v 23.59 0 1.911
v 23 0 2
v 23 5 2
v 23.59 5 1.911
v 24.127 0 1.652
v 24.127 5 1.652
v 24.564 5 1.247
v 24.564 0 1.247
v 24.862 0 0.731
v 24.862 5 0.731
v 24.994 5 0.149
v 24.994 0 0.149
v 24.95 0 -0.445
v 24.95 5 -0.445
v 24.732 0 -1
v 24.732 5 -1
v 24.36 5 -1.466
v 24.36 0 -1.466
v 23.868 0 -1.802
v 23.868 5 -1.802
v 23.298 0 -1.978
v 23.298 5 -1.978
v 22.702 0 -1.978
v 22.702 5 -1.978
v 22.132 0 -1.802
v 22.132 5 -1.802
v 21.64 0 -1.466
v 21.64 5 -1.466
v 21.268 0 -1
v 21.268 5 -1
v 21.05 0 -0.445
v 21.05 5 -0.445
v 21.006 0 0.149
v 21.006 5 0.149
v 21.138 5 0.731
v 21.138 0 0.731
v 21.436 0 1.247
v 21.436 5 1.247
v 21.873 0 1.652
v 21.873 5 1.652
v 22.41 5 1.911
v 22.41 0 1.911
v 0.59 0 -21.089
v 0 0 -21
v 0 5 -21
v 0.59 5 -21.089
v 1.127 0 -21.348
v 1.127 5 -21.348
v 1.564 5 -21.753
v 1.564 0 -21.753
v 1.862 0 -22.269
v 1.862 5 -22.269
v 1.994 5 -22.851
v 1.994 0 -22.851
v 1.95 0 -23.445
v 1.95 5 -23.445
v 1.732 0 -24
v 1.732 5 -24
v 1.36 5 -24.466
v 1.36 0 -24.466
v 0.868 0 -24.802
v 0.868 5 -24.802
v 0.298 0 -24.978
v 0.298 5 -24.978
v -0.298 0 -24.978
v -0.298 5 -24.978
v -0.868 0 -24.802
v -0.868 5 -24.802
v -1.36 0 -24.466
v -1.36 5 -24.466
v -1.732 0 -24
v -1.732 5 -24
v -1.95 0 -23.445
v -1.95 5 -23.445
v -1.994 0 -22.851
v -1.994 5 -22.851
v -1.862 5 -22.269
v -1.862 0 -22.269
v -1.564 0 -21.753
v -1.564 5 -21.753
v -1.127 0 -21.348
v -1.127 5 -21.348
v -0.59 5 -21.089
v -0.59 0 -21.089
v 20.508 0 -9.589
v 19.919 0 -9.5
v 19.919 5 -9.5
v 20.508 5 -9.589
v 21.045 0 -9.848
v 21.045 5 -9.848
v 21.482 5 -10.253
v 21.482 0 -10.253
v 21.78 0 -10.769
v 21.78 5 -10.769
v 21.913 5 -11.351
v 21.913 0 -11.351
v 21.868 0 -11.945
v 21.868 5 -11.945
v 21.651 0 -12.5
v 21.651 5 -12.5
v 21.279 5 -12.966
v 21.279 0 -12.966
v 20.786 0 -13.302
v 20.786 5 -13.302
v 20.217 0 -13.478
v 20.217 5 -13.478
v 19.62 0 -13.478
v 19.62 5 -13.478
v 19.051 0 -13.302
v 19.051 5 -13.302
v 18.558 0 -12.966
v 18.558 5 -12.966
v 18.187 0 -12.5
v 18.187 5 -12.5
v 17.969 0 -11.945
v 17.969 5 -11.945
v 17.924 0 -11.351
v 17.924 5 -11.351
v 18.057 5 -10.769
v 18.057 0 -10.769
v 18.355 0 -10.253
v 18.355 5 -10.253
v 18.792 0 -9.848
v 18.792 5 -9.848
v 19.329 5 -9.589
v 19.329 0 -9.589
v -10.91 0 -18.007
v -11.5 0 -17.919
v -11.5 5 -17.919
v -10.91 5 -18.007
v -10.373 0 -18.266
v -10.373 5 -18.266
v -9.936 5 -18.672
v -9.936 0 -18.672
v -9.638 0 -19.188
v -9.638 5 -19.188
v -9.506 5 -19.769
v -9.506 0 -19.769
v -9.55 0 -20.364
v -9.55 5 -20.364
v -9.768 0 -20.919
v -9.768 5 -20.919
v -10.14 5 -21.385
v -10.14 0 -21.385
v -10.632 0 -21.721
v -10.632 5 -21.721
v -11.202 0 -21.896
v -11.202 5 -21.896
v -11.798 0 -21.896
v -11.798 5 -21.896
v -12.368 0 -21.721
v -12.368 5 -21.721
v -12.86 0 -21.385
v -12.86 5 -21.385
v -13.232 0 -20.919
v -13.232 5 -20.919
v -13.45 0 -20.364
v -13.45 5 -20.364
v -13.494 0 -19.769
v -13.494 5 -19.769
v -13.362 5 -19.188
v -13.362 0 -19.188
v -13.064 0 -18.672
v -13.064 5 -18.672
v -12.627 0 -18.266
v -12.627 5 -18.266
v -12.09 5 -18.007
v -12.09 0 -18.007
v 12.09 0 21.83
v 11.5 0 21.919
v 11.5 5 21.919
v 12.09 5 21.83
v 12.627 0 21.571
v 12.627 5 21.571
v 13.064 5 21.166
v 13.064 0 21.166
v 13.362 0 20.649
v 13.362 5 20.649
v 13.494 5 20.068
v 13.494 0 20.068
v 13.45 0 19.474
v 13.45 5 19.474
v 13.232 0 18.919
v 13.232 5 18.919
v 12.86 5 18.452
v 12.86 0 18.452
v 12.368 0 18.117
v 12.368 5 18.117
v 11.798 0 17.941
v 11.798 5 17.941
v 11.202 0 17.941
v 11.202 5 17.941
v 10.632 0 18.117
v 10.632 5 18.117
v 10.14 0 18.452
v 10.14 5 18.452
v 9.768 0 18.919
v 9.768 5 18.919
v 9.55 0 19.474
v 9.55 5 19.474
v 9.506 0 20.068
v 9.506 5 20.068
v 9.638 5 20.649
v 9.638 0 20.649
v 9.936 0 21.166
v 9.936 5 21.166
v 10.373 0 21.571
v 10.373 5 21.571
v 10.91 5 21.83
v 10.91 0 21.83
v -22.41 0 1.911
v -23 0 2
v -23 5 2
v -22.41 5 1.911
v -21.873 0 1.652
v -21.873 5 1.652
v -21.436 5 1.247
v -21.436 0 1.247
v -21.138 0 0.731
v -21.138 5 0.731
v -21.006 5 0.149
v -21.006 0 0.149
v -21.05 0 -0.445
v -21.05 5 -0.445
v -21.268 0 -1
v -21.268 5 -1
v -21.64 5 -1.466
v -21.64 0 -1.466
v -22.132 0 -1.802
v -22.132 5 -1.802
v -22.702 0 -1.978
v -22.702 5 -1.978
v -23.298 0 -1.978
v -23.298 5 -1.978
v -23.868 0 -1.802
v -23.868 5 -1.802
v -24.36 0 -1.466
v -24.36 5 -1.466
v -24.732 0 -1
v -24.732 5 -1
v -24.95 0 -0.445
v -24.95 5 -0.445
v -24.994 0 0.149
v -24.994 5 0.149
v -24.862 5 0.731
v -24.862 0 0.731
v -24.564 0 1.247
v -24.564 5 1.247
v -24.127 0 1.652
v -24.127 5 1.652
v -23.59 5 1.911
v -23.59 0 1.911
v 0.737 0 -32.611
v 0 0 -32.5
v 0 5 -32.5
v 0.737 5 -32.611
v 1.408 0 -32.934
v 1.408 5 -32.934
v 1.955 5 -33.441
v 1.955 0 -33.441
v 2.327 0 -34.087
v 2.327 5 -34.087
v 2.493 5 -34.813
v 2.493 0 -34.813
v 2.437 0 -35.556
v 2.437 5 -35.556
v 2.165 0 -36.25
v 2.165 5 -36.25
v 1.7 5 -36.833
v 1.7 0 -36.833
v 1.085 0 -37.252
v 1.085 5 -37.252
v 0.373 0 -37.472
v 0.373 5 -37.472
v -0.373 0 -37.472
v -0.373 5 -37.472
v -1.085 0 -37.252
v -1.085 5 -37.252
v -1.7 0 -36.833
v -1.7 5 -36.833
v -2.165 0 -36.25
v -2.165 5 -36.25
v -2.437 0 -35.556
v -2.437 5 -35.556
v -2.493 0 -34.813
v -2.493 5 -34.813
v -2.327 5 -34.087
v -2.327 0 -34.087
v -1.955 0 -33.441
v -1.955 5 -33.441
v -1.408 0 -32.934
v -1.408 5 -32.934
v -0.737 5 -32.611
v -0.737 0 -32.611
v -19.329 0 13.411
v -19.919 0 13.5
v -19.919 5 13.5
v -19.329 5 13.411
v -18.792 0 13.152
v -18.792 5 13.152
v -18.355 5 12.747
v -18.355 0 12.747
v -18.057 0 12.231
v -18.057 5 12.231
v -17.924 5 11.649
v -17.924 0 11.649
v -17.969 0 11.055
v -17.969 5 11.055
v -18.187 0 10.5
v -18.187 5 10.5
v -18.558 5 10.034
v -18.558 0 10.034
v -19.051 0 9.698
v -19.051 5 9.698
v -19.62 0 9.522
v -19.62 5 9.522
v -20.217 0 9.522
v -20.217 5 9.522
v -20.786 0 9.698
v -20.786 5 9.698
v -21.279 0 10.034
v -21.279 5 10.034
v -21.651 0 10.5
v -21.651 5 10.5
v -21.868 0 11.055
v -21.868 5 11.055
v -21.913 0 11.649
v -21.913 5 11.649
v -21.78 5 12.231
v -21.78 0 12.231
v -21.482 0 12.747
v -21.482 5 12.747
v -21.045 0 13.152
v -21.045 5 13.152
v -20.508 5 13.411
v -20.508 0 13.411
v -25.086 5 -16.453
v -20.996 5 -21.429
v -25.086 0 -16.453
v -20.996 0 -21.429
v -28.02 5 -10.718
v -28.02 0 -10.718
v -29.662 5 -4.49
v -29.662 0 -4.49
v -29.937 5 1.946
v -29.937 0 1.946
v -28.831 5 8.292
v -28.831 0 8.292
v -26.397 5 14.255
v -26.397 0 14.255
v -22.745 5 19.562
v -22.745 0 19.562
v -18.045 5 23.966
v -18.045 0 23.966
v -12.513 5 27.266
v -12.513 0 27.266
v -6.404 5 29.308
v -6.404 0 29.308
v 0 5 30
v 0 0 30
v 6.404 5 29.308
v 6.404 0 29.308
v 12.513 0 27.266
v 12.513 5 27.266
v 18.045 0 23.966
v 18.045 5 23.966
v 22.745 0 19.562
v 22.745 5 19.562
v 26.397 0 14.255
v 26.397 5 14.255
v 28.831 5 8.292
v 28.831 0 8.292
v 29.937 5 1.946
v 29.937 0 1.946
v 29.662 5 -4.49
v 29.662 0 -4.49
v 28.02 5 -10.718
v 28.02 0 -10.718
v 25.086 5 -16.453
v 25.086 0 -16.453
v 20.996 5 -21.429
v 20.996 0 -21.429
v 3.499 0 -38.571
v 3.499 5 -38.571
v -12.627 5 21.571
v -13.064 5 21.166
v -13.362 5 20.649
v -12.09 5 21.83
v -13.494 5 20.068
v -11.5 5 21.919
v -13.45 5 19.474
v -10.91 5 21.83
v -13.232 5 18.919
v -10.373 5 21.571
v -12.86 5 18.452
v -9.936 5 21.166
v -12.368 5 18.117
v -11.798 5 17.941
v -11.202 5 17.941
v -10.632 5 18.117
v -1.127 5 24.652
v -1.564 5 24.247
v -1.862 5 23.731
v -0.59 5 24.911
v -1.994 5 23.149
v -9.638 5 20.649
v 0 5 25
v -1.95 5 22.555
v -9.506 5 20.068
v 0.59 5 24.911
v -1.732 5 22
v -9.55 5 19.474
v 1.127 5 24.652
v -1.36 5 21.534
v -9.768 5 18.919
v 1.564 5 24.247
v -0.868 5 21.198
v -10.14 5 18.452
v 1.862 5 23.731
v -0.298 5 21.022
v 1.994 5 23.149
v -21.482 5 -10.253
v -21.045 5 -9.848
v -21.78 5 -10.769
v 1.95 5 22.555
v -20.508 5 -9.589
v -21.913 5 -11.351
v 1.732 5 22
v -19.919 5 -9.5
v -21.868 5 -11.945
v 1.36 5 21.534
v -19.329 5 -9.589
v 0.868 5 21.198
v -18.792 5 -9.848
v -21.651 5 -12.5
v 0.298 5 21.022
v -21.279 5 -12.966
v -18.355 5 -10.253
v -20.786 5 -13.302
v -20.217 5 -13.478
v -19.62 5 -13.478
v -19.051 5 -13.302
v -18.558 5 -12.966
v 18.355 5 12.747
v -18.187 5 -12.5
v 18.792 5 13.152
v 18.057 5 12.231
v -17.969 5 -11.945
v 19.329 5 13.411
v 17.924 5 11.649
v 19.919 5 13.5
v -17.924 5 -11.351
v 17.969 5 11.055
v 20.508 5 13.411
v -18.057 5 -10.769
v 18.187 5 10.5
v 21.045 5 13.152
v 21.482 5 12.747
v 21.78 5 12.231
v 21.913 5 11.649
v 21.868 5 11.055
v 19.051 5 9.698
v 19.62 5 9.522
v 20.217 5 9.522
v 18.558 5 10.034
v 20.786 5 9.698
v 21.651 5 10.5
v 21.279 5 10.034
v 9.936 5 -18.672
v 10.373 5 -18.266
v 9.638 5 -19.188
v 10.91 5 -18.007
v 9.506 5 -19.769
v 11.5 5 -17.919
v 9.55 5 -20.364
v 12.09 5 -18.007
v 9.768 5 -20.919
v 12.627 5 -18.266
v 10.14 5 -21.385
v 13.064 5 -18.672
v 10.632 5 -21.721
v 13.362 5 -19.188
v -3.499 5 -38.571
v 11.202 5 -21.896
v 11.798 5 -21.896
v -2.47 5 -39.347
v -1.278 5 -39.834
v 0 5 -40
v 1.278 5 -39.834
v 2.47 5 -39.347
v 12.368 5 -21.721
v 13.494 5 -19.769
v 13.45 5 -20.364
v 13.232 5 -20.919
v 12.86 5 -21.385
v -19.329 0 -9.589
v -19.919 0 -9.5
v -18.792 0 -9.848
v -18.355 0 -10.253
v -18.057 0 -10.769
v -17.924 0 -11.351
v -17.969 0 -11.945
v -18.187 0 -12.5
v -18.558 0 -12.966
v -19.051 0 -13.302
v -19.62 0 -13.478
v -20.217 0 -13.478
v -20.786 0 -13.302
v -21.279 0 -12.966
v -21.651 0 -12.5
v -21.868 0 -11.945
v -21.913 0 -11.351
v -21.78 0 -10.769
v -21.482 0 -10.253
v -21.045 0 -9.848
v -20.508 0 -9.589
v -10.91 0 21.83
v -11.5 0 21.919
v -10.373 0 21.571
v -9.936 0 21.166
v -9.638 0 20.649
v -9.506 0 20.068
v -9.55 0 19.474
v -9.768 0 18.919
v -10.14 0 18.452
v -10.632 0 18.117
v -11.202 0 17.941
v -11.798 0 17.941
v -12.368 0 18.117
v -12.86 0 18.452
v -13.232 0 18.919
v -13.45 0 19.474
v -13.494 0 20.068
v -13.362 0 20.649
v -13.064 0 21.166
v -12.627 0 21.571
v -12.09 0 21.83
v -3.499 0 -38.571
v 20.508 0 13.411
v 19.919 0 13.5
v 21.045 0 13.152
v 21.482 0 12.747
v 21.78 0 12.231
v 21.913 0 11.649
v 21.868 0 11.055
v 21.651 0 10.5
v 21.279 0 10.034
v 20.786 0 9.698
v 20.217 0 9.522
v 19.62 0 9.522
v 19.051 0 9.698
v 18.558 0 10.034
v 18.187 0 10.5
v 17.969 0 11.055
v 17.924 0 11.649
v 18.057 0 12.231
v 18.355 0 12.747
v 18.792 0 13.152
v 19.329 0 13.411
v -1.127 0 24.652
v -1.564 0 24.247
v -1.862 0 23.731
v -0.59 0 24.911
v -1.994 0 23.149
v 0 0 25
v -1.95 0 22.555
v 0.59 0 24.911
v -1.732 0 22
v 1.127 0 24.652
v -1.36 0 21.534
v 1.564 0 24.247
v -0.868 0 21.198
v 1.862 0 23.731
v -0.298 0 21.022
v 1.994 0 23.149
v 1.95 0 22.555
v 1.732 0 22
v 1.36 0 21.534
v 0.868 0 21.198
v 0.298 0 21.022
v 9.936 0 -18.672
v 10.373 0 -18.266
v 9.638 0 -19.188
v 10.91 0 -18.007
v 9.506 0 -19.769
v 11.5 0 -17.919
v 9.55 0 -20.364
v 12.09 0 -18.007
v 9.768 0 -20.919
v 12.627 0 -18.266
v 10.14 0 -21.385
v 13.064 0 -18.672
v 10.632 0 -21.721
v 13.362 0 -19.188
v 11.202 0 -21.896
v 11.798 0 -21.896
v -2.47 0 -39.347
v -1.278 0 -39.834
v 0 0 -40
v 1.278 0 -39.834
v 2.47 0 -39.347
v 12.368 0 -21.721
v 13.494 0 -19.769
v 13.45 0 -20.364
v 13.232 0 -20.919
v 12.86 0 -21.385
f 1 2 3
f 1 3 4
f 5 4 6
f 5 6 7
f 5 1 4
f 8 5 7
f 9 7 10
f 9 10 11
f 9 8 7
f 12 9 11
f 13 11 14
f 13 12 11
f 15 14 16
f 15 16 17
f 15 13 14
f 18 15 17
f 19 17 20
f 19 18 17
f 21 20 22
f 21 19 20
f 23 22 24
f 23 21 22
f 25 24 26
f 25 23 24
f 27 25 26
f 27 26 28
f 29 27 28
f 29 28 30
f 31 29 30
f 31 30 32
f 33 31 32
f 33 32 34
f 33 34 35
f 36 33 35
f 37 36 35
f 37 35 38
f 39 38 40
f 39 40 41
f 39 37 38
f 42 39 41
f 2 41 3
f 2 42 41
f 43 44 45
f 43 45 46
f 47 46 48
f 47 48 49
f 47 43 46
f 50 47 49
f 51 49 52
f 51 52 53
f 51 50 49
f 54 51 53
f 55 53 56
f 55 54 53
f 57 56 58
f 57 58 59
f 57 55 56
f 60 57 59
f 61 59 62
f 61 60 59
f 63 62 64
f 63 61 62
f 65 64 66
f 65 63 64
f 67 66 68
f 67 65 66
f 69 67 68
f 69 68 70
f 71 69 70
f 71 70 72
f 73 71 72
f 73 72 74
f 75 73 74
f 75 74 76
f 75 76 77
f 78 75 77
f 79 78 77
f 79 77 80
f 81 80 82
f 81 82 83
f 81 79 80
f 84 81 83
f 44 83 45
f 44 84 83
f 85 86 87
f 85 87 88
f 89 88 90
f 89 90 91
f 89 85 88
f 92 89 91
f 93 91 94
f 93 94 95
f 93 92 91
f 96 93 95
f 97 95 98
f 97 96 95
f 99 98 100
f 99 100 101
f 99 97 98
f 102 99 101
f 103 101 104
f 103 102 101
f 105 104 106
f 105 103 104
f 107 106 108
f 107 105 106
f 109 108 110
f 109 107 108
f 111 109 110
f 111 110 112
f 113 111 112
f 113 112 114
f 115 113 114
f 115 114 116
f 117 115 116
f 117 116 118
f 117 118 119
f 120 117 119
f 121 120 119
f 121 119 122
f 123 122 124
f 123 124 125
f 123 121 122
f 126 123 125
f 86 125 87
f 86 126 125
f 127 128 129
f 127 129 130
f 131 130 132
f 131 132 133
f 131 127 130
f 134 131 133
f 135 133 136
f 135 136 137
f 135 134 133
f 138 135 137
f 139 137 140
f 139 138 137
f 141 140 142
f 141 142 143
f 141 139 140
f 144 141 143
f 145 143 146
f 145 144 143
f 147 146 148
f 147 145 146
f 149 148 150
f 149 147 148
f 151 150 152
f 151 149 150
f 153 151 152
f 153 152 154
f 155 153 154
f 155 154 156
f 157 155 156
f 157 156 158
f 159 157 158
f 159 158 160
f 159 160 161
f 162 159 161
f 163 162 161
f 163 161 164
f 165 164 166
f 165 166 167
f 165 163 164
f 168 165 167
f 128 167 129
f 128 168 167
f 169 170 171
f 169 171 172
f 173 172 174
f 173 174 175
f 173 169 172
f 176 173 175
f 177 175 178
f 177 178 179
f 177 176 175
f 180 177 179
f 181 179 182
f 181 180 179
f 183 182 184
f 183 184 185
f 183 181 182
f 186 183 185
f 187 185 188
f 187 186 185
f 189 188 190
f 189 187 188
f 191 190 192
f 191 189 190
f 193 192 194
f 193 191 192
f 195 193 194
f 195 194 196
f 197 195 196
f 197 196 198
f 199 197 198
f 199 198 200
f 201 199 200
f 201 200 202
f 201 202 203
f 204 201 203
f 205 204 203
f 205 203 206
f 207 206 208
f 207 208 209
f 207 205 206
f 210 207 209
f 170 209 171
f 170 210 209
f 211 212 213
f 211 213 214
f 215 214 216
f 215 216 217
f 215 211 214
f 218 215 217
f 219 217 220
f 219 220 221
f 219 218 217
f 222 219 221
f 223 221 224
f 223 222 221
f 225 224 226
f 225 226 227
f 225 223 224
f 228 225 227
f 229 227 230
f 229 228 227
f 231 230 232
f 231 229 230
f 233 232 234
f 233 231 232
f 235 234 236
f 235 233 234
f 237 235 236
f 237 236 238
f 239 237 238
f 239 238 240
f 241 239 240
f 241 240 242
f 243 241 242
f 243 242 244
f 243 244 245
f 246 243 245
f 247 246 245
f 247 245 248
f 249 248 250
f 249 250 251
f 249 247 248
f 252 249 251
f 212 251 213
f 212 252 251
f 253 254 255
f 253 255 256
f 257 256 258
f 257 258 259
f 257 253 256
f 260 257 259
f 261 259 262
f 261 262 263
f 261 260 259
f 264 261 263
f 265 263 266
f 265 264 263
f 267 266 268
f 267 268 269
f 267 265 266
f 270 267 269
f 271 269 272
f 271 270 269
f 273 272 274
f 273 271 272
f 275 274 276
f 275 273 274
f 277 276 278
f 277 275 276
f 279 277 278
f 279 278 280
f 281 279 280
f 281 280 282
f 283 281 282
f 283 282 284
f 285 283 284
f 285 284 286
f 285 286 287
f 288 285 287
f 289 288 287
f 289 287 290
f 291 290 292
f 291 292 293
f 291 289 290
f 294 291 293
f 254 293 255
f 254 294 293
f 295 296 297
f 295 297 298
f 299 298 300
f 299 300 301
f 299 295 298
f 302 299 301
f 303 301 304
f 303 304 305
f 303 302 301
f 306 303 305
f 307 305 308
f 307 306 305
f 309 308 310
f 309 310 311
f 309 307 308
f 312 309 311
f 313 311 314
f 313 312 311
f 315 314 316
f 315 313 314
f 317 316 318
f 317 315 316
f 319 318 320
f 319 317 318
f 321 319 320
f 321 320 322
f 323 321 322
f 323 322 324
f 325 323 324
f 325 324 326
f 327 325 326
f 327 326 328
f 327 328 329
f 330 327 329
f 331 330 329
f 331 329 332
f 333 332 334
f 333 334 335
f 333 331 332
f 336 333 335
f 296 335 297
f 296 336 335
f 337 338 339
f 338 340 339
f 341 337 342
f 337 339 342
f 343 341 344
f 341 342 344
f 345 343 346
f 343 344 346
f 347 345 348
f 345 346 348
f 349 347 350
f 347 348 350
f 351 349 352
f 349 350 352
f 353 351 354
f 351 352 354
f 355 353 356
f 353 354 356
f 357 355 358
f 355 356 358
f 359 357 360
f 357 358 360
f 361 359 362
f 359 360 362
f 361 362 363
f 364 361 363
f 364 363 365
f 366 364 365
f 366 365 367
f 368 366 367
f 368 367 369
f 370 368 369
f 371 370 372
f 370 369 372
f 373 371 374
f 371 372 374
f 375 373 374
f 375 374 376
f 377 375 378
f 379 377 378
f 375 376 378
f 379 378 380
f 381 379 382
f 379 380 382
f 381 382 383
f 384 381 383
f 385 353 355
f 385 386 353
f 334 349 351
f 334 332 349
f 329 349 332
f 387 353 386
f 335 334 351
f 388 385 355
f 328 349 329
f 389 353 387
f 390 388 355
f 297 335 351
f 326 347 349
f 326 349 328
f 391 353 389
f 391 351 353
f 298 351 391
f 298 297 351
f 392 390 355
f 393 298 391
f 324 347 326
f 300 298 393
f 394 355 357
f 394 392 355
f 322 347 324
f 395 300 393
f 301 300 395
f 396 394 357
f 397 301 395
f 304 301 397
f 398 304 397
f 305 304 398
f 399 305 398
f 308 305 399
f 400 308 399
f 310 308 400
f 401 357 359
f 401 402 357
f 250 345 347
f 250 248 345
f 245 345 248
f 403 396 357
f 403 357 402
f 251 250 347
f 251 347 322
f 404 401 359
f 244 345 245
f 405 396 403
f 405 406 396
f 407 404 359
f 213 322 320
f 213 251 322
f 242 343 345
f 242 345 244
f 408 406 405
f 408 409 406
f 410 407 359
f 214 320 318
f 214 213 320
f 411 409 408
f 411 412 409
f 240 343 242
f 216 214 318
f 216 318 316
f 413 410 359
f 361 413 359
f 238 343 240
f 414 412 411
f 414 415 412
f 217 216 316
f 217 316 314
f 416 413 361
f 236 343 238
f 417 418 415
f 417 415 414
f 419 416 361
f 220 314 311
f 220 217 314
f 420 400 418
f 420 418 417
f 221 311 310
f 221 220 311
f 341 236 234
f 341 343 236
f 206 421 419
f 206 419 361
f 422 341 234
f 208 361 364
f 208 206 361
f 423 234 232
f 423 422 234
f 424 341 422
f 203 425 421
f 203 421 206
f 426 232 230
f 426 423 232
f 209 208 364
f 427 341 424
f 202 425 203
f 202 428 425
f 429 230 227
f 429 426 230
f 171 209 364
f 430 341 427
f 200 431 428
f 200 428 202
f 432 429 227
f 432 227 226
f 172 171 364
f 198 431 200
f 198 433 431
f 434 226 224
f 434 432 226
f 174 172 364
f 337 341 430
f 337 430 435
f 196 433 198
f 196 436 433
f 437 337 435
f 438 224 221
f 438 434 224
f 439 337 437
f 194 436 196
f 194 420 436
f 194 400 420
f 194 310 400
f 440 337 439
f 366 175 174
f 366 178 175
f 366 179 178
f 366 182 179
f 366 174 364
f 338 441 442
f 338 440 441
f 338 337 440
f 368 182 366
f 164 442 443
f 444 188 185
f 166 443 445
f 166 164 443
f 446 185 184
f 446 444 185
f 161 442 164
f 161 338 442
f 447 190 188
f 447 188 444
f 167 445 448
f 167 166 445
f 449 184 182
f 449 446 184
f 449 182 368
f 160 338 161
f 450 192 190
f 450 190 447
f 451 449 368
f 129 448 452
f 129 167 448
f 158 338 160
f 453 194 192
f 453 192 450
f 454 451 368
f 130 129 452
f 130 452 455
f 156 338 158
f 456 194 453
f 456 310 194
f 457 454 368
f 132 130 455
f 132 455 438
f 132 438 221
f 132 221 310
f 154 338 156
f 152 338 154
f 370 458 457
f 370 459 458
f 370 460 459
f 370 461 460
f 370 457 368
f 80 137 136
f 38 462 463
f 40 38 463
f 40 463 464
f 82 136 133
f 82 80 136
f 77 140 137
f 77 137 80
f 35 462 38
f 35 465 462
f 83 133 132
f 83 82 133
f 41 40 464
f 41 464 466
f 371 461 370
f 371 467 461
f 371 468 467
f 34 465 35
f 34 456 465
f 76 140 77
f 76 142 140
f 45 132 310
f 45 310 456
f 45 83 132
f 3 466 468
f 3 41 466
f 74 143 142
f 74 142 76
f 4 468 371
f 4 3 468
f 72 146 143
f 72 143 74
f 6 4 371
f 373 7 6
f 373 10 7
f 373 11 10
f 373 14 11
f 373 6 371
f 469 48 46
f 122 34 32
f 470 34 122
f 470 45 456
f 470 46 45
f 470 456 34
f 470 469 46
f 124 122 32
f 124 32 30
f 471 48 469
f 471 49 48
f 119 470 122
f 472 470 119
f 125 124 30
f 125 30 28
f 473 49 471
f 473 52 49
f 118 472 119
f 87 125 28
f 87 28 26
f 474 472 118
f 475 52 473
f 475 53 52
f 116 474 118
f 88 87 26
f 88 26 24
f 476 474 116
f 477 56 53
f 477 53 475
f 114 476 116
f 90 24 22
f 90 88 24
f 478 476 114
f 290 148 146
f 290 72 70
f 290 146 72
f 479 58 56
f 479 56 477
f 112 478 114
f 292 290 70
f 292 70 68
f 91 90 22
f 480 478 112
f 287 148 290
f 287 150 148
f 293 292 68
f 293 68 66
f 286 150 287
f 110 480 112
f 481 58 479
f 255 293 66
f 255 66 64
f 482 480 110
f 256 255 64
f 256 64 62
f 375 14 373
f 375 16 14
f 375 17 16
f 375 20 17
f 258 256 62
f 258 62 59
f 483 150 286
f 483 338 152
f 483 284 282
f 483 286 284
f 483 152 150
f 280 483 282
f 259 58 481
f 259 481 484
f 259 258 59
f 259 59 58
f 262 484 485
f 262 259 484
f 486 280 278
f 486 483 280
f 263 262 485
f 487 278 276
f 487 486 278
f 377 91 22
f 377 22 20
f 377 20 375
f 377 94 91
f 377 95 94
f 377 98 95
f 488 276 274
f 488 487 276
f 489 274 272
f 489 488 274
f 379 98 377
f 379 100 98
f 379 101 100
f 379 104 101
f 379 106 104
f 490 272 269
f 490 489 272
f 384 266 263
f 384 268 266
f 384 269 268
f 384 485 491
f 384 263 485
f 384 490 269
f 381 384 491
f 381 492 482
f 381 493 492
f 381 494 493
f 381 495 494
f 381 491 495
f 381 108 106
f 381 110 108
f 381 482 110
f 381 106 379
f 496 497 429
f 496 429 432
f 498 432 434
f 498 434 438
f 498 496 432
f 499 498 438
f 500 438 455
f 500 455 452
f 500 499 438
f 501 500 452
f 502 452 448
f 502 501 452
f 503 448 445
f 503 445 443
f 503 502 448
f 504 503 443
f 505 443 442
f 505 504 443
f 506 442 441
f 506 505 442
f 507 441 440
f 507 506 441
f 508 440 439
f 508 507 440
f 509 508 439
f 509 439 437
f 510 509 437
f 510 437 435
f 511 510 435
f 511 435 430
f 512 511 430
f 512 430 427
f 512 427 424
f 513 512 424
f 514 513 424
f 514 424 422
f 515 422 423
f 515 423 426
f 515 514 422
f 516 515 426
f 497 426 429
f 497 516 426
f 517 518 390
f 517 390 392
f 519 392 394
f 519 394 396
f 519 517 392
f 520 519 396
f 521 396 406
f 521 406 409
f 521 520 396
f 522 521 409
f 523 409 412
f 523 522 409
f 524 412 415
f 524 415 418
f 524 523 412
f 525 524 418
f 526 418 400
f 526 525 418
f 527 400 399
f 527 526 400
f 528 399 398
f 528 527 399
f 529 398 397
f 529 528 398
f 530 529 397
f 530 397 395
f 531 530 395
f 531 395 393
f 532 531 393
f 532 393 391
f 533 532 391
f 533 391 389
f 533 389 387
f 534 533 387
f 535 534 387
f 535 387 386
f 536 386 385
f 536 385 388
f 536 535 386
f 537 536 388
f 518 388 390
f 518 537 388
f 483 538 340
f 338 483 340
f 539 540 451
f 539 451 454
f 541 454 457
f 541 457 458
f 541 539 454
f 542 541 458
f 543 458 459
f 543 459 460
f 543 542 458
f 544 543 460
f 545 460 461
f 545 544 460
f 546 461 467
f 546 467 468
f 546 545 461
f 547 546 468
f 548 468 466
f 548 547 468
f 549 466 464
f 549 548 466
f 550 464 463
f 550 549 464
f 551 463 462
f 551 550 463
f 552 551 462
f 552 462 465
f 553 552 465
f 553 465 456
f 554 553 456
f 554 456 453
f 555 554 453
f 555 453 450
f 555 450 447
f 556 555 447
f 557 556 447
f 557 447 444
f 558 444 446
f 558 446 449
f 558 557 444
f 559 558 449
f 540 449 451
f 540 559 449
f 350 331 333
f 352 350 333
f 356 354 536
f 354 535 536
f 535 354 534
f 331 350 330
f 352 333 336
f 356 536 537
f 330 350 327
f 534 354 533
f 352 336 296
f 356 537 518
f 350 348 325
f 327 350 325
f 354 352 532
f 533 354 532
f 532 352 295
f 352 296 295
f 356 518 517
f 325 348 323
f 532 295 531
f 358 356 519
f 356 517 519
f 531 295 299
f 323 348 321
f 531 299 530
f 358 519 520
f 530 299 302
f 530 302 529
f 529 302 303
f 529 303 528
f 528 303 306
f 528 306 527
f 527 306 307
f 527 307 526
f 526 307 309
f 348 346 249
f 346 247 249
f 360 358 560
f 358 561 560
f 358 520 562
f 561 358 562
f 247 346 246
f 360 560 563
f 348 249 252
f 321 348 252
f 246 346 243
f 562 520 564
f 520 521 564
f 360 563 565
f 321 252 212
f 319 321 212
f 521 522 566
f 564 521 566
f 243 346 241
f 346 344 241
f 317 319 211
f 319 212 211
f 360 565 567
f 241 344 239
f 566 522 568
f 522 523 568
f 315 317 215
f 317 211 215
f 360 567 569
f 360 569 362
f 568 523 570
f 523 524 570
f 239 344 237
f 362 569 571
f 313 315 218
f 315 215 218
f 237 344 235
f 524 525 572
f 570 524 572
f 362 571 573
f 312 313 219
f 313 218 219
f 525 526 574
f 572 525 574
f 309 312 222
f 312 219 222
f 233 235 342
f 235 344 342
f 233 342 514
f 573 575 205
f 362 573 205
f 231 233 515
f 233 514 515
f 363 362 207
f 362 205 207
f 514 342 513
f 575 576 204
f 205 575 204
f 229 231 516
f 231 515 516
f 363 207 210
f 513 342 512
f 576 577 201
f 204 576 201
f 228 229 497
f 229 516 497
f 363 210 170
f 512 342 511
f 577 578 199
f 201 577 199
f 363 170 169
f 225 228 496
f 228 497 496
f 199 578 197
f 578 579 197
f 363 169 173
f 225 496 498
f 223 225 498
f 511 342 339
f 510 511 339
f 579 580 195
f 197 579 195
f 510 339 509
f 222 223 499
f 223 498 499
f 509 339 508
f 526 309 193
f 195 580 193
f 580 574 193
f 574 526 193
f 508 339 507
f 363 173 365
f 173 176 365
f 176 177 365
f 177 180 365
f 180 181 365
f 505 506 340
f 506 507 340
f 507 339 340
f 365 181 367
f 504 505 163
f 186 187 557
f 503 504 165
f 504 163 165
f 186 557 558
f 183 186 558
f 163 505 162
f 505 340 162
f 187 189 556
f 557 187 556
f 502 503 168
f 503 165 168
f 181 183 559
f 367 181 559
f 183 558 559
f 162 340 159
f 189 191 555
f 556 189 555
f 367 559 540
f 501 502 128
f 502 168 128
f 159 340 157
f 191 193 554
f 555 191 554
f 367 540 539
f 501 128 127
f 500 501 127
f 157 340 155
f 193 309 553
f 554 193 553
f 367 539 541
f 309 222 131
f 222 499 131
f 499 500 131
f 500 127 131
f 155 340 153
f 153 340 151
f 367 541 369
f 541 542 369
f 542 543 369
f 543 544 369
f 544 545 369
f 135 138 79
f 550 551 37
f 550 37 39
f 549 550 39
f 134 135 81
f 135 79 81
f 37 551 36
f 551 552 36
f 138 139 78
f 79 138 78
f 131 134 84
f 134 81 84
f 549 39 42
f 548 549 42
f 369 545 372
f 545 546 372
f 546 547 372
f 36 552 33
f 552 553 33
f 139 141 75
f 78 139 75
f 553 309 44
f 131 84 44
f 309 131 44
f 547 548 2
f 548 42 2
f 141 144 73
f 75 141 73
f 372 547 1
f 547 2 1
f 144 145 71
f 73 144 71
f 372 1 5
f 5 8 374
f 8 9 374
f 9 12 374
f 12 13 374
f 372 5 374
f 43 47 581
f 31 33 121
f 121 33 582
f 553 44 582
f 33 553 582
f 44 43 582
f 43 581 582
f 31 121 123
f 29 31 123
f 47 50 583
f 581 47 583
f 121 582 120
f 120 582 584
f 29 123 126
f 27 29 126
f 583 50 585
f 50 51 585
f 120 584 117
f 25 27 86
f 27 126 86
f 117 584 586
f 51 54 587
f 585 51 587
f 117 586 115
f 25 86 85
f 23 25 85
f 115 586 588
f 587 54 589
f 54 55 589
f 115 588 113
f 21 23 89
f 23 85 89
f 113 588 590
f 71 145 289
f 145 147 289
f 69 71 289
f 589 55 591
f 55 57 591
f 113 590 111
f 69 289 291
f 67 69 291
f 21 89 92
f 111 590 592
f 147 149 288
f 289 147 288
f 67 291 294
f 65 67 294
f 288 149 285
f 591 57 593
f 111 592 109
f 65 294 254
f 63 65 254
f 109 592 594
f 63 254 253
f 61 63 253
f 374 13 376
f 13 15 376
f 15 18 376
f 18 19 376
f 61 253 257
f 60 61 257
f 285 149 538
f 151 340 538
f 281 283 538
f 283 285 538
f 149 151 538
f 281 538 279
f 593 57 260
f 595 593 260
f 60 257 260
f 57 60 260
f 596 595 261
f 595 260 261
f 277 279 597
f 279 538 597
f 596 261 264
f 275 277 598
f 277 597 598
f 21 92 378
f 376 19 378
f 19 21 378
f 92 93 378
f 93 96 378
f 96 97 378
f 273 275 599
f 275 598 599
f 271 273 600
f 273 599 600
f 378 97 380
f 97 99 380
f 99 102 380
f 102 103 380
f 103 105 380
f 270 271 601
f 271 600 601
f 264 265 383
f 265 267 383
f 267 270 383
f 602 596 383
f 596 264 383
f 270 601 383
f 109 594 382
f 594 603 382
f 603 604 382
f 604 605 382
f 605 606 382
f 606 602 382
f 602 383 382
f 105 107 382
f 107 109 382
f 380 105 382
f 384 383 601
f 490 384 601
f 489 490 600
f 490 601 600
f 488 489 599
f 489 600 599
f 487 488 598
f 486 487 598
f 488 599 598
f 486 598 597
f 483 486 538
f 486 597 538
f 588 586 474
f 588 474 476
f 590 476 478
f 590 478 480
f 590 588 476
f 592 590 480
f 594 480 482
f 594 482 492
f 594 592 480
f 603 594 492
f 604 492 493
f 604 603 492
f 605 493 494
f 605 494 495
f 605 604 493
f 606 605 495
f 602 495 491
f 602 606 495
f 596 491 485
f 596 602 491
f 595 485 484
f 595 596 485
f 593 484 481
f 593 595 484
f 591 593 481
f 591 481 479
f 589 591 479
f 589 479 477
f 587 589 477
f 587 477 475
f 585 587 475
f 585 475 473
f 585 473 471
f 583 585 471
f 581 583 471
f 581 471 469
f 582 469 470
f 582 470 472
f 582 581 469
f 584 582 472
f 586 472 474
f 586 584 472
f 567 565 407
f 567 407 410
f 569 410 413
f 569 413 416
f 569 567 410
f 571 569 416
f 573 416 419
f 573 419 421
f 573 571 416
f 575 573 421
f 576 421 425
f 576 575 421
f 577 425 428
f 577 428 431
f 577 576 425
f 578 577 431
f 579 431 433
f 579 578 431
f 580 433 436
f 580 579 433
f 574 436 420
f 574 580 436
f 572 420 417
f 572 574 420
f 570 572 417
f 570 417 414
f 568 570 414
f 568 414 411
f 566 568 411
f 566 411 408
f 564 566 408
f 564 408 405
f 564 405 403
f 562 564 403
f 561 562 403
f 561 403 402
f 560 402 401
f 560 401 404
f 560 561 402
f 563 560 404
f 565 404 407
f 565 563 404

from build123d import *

# Parameters (mm, degrees)
SKETCH1_R           = 30
SKETCH1_R_2         = 2
SKETCH1_R_3         = 5
SKETCH1_R_4         = 2.5
BOSS_EXTRUDE1_DEPTH = 5


with BuildPart() as part:
    # Sketch1 → Boss-Extrude1 (new body)
    # profile 1 of 4: a face of its own
    with BuildSketch(Plane(origin=(0, 0, 0), x_dir=(1, 0, 0), z_dir=(0, 1, 0))):
        Circle(SKETCH1_R)
        with Locations(Location((-11.5, 19.918584287, 0), (0, 0, 270))):
            Circle(SKETCH1_R_2, mode=Mode.SUBTRACT)
        with Locations(Location((-19.918584287, 11.5, 0), (0, 0, 270))):
            Circle(SKETCH1_R_2, mode=Mode.SUBTRACT)
        with Locations(Location((-23, 0, 0), (0, 0, 270))):
            Circle(SKETCH1_R_2, mode=Mode.SUBTRACT)
        with Locations(Location((-19.918584287, -11.5, 0), (0, 0, 270))):
            Circle(SKETCH1_R_2, mode=Mode.SUBTRACT)
        with Locations(Location((-11.5, -19.918584287, 0), (0, 0, 270))):
            Circle(SKETCH1_R_2, mode=Mode.SUBTRACT)
        with Locations(Location((0, -23, 0), (0, 0, 270))):
            Circle(SKETCH1_R_2, mode=Mode.SUBTRACT)
        with Locations(Location((11.5, -19.918584287, 0), (0, 0, 270))):
            Circle(SKETCH1_R_2, mode=Mode.SUBTRACT)
        with Locations(Location((19.918584287, -11.5, 0), (0, 0, 270))):
            Circle(SKETCH1_R_2, mode=Mode.SUBTRACT)
        with Locations(Location((23, 0, 0), (0, 0, 270))):
            Circle(SKETCH1_R_2, mode=Mode.SUBTRACT)
        with Locations(Location((19.918584287, 11.5, 0), (0, 0, 270))):
            Circle(SKETCH1_R_2, mode=Mode.SUBTRACT)
        with Locations(Location((11.5, 19.918584287, 0), (0, 0, 270))):
            Circle(SKETCH1_R_2, mode=Mode.SUBTRACT)
        with Locations(Location((0, 23, 0), (0, 0, 270))):
            Circle(SKETCH1_R_2, mode=Mode.SUBTRACT)
    # profile 2 of 4: a face of its own
    with BuildSketch(Plane(origin=(0, 0, 0), x_dir=(1, 0, 0), z_dir=(0, 1, 0))):
        with BuildLine():
            Line((20.995626367, 21.428571429), (3.499271061, 38.571428571))
            ThreePointArc((3.499271061, 38.571428571), (4.609574563, 36.936962144), (5, 35))
            ThreePointArc((5, 35), (3.535533899, 31.464466087), (-1.9e-08, 30))
            ThreePointArc((-1.9e-08, 30), (11.338934182, 27.774602997), (20.995626367, 21.428571429))
        make_face()
    # profile 3 of 4: a face of its own
    with BuildSketch(Plane(origin=(0, 0, 0), x_dir=(1, 0, 0), z_dir=(0, 1, 0))):
        with BuildLine():
            ThreePointArc((-1.9e-08, 30), (-4.629100502, 33.110177644), (-3.499271061, 38.571428571))
            Line((-3.499271061, 38.571428571), (-20.995626367, 21.428571429))
            ThreePointArc((-20.995626367, 21.428571429), (-11.338934199, 27.77460299), (-1.9e-08, 30))
        make_face()
    # profile 4 of 4: a face of its own
    with BuildSketch(Plane(origin=(0, 0, 0), x_dir=(1, 0, 0), z_dir=(0, 1, 0))):
        with Locations((0, 35)):
            Circle(SKETCH1_R_3)
        with Locations(Location((0, 35, 0), (0, 0, 270))):
            Circle(SKETCH1_R_4, mode=Mode.SUBTRACT)
    extrude(amount=BOSS_EXTRUDE1_DEPTH)


solid = part.part
